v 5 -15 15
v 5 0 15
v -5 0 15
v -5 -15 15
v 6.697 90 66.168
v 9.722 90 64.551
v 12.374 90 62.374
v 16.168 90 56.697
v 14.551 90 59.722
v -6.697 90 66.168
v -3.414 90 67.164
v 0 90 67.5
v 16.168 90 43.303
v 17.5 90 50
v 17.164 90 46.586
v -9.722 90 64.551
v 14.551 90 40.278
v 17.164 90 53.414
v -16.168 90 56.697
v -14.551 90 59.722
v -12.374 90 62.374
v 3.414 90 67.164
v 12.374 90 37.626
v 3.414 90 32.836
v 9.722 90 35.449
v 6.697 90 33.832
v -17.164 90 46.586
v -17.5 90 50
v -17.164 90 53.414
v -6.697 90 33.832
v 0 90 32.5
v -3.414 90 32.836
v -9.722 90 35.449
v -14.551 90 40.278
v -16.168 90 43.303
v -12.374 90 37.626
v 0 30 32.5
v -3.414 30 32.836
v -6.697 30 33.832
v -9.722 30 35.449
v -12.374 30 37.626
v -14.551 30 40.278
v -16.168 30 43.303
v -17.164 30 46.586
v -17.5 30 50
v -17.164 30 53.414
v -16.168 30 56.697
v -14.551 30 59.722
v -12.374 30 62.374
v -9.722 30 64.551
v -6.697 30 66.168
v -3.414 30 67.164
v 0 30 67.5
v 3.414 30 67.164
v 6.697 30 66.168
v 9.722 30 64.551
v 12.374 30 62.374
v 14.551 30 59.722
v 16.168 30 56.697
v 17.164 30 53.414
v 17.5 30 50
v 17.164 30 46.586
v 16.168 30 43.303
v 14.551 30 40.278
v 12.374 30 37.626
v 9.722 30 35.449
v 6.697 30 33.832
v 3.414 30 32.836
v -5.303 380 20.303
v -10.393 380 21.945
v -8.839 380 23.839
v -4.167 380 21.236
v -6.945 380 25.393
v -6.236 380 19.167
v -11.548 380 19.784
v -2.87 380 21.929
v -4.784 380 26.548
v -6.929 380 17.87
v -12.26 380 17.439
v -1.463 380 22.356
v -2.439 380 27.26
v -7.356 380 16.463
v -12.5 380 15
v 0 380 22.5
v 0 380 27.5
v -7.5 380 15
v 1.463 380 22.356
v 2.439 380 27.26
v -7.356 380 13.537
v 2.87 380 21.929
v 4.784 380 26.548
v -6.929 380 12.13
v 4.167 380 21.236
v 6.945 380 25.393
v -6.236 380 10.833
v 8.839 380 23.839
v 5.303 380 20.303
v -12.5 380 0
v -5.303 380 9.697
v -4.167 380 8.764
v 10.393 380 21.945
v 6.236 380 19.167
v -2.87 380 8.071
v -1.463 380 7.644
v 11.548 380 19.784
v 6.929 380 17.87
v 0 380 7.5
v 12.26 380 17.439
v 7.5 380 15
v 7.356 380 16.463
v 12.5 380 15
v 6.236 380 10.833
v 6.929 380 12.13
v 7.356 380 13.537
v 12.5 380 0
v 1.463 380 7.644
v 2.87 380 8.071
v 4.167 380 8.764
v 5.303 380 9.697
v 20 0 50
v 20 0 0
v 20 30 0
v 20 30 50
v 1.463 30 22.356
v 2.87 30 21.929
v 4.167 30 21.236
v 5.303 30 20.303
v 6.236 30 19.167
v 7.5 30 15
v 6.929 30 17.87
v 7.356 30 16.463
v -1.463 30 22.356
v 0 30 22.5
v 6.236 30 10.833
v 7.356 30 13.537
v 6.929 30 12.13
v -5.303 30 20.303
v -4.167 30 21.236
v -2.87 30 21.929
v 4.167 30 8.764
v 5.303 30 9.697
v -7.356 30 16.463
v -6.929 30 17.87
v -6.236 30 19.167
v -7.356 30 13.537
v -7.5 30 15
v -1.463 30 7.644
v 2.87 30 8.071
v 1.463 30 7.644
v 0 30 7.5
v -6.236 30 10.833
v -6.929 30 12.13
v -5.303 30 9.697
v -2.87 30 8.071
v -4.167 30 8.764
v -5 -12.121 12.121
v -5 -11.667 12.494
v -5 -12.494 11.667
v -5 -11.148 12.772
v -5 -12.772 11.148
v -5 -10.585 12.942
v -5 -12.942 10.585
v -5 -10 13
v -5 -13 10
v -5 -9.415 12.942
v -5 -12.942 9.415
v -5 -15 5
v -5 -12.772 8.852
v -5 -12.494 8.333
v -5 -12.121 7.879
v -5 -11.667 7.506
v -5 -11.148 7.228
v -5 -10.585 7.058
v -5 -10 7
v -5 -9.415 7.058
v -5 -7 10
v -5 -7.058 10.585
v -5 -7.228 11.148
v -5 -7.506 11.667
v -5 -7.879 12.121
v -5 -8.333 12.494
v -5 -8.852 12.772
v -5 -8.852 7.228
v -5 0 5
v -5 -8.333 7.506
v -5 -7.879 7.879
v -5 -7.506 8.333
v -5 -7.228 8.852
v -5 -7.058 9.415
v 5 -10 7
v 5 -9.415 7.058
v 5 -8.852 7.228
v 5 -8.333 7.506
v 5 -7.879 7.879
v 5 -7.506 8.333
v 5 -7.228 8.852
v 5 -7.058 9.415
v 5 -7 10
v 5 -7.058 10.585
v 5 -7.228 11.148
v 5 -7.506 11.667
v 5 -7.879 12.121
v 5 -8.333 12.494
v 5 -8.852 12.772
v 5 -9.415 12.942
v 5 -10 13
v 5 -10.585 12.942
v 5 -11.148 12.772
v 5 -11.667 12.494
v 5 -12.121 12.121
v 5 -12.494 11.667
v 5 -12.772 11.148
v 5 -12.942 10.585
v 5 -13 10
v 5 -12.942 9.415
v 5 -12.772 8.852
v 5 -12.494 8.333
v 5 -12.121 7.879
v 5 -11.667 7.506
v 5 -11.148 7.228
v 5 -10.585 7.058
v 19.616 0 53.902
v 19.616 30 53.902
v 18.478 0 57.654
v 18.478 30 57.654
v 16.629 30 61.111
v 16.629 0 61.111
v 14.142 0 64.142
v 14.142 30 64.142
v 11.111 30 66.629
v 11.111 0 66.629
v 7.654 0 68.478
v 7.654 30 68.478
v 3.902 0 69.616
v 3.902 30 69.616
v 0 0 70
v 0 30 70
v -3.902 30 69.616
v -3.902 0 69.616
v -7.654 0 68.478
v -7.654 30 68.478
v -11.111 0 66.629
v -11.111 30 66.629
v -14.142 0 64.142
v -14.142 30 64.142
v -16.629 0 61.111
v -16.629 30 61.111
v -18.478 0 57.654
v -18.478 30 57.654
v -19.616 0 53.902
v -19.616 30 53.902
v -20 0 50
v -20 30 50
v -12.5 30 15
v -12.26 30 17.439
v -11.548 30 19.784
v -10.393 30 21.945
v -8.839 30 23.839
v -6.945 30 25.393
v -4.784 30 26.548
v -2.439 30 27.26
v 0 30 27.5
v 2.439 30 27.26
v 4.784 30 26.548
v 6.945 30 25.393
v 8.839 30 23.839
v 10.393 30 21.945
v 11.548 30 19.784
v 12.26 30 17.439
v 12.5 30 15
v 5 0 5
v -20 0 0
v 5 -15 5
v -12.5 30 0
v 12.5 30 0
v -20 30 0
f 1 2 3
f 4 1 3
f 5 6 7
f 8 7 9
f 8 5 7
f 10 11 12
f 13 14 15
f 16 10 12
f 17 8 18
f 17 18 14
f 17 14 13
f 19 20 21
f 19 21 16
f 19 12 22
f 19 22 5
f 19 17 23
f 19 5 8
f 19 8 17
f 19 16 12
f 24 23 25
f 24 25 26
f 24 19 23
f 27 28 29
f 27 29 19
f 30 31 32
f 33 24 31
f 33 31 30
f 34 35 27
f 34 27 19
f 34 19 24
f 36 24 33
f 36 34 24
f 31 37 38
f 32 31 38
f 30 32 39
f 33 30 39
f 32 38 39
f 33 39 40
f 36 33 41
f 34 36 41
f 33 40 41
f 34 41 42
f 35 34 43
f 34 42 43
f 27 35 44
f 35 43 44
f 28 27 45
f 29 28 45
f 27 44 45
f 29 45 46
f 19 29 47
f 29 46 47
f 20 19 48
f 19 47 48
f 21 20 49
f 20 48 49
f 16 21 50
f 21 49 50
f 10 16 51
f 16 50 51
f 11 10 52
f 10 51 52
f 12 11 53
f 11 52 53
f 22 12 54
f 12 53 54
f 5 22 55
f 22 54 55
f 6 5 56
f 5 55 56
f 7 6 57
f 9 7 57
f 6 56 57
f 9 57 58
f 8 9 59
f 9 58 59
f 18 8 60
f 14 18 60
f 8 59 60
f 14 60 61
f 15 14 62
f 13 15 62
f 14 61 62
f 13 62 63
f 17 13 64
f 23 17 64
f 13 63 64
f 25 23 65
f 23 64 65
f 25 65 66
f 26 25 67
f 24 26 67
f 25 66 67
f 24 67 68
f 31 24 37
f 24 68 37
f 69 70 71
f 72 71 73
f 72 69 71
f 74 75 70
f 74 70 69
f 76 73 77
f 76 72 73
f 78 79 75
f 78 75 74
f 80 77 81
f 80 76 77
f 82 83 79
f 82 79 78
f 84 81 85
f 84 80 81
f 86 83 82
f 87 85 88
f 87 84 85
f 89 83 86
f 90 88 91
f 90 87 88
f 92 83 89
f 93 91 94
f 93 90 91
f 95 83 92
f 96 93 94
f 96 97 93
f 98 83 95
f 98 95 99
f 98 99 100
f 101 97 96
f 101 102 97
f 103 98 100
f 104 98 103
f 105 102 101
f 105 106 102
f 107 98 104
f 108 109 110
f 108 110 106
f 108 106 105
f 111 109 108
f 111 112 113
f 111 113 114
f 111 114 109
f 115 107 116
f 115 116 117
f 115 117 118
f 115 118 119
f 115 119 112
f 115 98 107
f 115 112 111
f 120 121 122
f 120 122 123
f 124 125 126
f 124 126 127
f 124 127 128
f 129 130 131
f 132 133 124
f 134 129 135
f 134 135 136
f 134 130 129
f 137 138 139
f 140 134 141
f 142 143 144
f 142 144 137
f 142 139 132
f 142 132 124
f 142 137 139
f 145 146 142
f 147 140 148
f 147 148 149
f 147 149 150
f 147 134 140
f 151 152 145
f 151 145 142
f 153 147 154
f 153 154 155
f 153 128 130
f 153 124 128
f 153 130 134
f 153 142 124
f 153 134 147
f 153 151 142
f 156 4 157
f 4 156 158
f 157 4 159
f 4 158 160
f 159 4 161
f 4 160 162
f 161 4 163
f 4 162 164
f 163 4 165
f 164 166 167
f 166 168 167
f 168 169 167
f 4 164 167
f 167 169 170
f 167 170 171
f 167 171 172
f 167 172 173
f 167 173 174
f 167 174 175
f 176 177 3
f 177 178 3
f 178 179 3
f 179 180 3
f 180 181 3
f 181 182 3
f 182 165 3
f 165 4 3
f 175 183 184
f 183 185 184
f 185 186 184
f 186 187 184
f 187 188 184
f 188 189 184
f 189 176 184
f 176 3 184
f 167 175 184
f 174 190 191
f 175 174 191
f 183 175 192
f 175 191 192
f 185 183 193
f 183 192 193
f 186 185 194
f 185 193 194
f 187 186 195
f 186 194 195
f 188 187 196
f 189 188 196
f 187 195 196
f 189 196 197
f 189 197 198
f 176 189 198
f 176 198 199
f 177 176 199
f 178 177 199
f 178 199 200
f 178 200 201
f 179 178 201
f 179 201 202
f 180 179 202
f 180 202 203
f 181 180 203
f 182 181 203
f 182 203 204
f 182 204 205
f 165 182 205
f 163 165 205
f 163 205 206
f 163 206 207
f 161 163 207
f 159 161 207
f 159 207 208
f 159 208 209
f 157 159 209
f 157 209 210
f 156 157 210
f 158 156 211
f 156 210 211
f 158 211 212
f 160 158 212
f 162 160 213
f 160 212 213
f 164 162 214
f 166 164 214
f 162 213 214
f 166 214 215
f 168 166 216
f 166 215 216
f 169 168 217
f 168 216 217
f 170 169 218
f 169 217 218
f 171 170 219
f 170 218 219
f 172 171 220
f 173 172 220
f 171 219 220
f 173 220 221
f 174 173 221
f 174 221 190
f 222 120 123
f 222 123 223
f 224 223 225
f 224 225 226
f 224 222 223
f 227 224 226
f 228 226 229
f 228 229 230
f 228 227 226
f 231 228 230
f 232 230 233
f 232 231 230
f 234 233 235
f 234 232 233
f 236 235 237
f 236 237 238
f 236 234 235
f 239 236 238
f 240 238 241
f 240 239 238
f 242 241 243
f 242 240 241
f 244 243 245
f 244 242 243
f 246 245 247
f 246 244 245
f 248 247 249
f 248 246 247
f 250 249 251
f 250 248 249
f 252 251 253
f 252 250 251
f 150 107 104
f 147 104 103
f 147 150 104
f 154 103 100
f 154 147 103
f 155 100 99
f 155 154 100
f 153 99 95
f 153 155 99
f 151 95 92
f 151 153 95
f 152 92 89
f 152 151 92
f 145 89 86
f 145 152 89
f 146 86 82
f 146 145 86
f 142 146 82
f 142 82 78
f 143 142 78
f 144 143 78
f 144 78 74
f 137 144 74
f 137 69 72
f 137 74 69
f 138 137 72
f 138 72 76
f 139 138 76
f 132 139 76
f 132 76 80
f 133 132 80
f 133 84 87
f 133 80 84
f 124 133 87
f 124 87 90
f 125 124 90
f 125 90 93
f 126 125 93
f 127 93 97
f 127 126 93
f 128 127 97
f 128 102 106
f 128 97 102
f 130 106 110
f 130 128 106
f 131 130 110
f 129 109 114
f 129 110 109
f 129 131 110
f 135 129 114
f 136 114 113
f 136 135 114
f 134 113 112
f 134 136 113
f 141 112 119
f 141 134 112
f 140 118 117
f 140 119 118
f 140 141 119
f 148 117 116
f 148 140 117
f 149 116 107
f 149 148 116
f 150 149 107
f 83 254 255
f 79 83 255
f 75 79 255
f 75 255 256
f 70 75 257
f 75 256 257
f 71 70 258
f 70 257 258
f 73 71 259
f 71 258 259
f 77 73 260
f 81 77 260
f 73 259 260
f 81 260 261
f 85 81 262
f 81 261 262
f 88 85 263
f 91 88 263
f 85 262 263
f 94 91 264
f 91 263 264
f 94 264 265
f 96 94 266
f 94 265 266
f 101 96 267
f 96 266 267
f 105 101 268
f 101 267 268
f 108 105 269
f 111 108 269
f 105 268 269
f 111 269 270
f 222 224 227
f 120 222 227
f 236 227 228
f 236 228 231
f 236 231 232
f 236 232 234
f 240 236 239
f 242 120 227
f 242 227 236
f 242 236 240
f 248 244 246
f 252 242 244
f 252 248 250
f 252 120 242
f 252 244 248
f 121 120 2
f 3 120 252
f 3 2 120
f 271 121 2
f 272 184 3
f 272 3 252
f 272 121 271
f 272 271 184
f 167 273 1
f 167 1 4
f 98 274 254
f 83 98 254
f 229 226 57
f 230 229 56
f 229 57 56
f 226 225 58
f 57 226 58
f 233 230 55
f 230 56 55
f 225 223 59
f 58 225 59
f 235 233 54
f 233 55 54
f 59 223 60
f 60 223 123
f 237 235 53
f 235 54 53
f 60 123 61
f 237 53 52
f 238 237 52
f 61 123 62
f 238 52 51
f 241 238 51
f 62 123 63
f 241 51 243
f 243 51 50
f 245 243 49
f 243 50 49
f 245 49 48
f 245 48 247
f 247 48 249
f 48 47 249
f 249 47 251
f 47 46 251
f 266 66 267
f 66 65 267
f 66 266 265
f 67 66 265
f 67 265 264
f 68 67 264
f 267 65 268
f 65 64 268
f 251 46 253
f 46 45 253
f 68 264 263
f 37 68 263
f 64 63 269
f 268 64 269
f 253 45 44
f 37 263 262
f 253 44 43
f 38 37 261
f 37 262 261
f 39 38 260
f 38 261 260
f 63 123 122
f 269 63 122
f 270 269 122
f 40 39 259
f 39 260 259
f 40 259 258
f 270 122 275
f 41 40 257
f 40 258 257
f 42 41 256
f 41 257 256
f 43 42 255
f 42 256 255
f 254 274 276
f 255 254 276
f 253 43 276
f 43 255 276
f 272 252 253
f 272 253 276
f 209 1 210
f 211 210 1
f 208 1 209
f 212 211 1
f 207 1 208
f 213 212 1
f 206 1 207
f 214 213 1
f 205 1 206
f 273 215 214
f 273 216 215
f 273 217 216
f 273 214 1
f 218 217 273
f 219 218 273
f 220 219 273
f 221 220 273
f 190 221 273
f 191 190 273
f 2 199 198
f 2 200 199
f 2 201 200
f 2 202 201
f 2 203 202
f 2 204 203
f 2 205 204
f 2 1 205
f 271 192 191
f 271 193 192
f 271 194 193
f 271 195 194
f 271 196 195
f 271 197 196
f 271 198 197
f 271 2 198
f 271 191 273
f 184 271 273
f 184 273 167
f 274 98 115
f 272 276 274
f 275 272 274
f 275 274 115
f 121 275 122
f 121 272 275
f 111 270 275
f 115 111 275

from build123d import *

# Parameters (mm, degrees)
BOSS_EXTRUDE1_DEPTH     = 30
SKETCH2_R               = 17.5
BOSS_EXTRUDE2_DEPTH     = 60
BOSS_EXTRUDE3_DEPTH     = 350
CUT_EXTRUDE1_DEPTH      = 387.910842443
CUT_EXTRUDE1_DEPTH_BACK = 350
SKETCH4_R               = 7.5
SKETCH5_W               = 10
SKETCH5_H               = 10
BOSS_EXTRUDE4_DEPTH     = 15
SKETCH6_R               = 3
CUT_EXTRUDE2_DEPTH      = 388.201497931


with BuildPart() as part:
    # Sketch1 → Boss-Extrude1 (new body)
    with BuildSketch(Plane(origin=(0, 0, 0), x_dir=(1, 0, 0), z_dir=(0, 1, 0))):
        with BuildLine():
            Line((-20, -50), (-20, 0))
            Line((-20, 0), (20, 0))
            Line((20, 0), (20, -50))
            ThreePointArc((20, -50), (0, -70), (-20, -50))
        make_face()
    extrude(amount=BOSS_EXTRUDE1_DEPTH)

    # Sketch2 → Boss-Extrude2 (add)
    with BuildSketch(Plane(origin=(0, 30, 0), x_dir=(1, 0, 0), z_dir=(0, 1, 0))):
        with Locations(Location((0, -50, 0), (0, 0, 90))):
            Circle(SKETCH2_R)
    extrude(amount=BOSS_EXTRUDE2_DEPTH)

    # Sketch3 → Boss-Extrude3 (add)
    with BuildSketch(Plane(origin=(0, 30, 0), x_dir=(1, 0, 0), z_dir=(0, 1, 0))):
        with BuildLine():
            Line((-12.5, 0), (-12.5, -15))
            ThreePointArc((-12.5, -15), (0, -27.5), (12.5, -15))
            Line((12.5, -15), (12.5, 0))
            Line((12.5, 0), (-12.5, 0))
        make_face()
    extrude(amount=BOSS_EXTRUDE3_DEPTH)

    # Sketch4 → Cut-Extrude1 (cut, two sides: drawn at the far end of the back side and taken through both)
    with BuildSketch(Plane(origin=(0, 380, 0), x_dir=(1, 0, 0), z_dir=(0, 1, 0)).offset(-CUT_EXTRUDE1_DEPTH_BACK)):
        with Locations(Location((0, -15, 0), (0, 0, 90))):
            Circle(SKETCH4_R)
    extrude(amount=CUT_EXTRUDE1_DEPTH + CUT_EXTRUDE1_DEPTH_BACK, mode=Mode.SUBTRACT)

    # Sketch5 → Boss-Extrude4 (add)
    with BuildSketch(Plane(origin=(0, 0, 0), x_dir=(-1, 0, 0), z_dir=(0, -1, 0))):
        with Locations((0, -10)):
            Rectangle(SKETCH5_W, SKETCH5_H)
    extrude(amount=BOSS_EXTRUDE4_DEPTH)

    # Sketch6 → Cut-Extrude2 (cut, through all)
    with BuildSketch(Plane(origin=(5, 0, 0), x_dir=(0, 0, -1), z_dir=(1, 0, 0))):
        with Locations((-10, -10)):
            Circle(SKETCH6_R)
    extrude(amount=-CUT_EXTRUDE2_DEPTH, mode=Mode.SUBTRACT)


solid = part.part
